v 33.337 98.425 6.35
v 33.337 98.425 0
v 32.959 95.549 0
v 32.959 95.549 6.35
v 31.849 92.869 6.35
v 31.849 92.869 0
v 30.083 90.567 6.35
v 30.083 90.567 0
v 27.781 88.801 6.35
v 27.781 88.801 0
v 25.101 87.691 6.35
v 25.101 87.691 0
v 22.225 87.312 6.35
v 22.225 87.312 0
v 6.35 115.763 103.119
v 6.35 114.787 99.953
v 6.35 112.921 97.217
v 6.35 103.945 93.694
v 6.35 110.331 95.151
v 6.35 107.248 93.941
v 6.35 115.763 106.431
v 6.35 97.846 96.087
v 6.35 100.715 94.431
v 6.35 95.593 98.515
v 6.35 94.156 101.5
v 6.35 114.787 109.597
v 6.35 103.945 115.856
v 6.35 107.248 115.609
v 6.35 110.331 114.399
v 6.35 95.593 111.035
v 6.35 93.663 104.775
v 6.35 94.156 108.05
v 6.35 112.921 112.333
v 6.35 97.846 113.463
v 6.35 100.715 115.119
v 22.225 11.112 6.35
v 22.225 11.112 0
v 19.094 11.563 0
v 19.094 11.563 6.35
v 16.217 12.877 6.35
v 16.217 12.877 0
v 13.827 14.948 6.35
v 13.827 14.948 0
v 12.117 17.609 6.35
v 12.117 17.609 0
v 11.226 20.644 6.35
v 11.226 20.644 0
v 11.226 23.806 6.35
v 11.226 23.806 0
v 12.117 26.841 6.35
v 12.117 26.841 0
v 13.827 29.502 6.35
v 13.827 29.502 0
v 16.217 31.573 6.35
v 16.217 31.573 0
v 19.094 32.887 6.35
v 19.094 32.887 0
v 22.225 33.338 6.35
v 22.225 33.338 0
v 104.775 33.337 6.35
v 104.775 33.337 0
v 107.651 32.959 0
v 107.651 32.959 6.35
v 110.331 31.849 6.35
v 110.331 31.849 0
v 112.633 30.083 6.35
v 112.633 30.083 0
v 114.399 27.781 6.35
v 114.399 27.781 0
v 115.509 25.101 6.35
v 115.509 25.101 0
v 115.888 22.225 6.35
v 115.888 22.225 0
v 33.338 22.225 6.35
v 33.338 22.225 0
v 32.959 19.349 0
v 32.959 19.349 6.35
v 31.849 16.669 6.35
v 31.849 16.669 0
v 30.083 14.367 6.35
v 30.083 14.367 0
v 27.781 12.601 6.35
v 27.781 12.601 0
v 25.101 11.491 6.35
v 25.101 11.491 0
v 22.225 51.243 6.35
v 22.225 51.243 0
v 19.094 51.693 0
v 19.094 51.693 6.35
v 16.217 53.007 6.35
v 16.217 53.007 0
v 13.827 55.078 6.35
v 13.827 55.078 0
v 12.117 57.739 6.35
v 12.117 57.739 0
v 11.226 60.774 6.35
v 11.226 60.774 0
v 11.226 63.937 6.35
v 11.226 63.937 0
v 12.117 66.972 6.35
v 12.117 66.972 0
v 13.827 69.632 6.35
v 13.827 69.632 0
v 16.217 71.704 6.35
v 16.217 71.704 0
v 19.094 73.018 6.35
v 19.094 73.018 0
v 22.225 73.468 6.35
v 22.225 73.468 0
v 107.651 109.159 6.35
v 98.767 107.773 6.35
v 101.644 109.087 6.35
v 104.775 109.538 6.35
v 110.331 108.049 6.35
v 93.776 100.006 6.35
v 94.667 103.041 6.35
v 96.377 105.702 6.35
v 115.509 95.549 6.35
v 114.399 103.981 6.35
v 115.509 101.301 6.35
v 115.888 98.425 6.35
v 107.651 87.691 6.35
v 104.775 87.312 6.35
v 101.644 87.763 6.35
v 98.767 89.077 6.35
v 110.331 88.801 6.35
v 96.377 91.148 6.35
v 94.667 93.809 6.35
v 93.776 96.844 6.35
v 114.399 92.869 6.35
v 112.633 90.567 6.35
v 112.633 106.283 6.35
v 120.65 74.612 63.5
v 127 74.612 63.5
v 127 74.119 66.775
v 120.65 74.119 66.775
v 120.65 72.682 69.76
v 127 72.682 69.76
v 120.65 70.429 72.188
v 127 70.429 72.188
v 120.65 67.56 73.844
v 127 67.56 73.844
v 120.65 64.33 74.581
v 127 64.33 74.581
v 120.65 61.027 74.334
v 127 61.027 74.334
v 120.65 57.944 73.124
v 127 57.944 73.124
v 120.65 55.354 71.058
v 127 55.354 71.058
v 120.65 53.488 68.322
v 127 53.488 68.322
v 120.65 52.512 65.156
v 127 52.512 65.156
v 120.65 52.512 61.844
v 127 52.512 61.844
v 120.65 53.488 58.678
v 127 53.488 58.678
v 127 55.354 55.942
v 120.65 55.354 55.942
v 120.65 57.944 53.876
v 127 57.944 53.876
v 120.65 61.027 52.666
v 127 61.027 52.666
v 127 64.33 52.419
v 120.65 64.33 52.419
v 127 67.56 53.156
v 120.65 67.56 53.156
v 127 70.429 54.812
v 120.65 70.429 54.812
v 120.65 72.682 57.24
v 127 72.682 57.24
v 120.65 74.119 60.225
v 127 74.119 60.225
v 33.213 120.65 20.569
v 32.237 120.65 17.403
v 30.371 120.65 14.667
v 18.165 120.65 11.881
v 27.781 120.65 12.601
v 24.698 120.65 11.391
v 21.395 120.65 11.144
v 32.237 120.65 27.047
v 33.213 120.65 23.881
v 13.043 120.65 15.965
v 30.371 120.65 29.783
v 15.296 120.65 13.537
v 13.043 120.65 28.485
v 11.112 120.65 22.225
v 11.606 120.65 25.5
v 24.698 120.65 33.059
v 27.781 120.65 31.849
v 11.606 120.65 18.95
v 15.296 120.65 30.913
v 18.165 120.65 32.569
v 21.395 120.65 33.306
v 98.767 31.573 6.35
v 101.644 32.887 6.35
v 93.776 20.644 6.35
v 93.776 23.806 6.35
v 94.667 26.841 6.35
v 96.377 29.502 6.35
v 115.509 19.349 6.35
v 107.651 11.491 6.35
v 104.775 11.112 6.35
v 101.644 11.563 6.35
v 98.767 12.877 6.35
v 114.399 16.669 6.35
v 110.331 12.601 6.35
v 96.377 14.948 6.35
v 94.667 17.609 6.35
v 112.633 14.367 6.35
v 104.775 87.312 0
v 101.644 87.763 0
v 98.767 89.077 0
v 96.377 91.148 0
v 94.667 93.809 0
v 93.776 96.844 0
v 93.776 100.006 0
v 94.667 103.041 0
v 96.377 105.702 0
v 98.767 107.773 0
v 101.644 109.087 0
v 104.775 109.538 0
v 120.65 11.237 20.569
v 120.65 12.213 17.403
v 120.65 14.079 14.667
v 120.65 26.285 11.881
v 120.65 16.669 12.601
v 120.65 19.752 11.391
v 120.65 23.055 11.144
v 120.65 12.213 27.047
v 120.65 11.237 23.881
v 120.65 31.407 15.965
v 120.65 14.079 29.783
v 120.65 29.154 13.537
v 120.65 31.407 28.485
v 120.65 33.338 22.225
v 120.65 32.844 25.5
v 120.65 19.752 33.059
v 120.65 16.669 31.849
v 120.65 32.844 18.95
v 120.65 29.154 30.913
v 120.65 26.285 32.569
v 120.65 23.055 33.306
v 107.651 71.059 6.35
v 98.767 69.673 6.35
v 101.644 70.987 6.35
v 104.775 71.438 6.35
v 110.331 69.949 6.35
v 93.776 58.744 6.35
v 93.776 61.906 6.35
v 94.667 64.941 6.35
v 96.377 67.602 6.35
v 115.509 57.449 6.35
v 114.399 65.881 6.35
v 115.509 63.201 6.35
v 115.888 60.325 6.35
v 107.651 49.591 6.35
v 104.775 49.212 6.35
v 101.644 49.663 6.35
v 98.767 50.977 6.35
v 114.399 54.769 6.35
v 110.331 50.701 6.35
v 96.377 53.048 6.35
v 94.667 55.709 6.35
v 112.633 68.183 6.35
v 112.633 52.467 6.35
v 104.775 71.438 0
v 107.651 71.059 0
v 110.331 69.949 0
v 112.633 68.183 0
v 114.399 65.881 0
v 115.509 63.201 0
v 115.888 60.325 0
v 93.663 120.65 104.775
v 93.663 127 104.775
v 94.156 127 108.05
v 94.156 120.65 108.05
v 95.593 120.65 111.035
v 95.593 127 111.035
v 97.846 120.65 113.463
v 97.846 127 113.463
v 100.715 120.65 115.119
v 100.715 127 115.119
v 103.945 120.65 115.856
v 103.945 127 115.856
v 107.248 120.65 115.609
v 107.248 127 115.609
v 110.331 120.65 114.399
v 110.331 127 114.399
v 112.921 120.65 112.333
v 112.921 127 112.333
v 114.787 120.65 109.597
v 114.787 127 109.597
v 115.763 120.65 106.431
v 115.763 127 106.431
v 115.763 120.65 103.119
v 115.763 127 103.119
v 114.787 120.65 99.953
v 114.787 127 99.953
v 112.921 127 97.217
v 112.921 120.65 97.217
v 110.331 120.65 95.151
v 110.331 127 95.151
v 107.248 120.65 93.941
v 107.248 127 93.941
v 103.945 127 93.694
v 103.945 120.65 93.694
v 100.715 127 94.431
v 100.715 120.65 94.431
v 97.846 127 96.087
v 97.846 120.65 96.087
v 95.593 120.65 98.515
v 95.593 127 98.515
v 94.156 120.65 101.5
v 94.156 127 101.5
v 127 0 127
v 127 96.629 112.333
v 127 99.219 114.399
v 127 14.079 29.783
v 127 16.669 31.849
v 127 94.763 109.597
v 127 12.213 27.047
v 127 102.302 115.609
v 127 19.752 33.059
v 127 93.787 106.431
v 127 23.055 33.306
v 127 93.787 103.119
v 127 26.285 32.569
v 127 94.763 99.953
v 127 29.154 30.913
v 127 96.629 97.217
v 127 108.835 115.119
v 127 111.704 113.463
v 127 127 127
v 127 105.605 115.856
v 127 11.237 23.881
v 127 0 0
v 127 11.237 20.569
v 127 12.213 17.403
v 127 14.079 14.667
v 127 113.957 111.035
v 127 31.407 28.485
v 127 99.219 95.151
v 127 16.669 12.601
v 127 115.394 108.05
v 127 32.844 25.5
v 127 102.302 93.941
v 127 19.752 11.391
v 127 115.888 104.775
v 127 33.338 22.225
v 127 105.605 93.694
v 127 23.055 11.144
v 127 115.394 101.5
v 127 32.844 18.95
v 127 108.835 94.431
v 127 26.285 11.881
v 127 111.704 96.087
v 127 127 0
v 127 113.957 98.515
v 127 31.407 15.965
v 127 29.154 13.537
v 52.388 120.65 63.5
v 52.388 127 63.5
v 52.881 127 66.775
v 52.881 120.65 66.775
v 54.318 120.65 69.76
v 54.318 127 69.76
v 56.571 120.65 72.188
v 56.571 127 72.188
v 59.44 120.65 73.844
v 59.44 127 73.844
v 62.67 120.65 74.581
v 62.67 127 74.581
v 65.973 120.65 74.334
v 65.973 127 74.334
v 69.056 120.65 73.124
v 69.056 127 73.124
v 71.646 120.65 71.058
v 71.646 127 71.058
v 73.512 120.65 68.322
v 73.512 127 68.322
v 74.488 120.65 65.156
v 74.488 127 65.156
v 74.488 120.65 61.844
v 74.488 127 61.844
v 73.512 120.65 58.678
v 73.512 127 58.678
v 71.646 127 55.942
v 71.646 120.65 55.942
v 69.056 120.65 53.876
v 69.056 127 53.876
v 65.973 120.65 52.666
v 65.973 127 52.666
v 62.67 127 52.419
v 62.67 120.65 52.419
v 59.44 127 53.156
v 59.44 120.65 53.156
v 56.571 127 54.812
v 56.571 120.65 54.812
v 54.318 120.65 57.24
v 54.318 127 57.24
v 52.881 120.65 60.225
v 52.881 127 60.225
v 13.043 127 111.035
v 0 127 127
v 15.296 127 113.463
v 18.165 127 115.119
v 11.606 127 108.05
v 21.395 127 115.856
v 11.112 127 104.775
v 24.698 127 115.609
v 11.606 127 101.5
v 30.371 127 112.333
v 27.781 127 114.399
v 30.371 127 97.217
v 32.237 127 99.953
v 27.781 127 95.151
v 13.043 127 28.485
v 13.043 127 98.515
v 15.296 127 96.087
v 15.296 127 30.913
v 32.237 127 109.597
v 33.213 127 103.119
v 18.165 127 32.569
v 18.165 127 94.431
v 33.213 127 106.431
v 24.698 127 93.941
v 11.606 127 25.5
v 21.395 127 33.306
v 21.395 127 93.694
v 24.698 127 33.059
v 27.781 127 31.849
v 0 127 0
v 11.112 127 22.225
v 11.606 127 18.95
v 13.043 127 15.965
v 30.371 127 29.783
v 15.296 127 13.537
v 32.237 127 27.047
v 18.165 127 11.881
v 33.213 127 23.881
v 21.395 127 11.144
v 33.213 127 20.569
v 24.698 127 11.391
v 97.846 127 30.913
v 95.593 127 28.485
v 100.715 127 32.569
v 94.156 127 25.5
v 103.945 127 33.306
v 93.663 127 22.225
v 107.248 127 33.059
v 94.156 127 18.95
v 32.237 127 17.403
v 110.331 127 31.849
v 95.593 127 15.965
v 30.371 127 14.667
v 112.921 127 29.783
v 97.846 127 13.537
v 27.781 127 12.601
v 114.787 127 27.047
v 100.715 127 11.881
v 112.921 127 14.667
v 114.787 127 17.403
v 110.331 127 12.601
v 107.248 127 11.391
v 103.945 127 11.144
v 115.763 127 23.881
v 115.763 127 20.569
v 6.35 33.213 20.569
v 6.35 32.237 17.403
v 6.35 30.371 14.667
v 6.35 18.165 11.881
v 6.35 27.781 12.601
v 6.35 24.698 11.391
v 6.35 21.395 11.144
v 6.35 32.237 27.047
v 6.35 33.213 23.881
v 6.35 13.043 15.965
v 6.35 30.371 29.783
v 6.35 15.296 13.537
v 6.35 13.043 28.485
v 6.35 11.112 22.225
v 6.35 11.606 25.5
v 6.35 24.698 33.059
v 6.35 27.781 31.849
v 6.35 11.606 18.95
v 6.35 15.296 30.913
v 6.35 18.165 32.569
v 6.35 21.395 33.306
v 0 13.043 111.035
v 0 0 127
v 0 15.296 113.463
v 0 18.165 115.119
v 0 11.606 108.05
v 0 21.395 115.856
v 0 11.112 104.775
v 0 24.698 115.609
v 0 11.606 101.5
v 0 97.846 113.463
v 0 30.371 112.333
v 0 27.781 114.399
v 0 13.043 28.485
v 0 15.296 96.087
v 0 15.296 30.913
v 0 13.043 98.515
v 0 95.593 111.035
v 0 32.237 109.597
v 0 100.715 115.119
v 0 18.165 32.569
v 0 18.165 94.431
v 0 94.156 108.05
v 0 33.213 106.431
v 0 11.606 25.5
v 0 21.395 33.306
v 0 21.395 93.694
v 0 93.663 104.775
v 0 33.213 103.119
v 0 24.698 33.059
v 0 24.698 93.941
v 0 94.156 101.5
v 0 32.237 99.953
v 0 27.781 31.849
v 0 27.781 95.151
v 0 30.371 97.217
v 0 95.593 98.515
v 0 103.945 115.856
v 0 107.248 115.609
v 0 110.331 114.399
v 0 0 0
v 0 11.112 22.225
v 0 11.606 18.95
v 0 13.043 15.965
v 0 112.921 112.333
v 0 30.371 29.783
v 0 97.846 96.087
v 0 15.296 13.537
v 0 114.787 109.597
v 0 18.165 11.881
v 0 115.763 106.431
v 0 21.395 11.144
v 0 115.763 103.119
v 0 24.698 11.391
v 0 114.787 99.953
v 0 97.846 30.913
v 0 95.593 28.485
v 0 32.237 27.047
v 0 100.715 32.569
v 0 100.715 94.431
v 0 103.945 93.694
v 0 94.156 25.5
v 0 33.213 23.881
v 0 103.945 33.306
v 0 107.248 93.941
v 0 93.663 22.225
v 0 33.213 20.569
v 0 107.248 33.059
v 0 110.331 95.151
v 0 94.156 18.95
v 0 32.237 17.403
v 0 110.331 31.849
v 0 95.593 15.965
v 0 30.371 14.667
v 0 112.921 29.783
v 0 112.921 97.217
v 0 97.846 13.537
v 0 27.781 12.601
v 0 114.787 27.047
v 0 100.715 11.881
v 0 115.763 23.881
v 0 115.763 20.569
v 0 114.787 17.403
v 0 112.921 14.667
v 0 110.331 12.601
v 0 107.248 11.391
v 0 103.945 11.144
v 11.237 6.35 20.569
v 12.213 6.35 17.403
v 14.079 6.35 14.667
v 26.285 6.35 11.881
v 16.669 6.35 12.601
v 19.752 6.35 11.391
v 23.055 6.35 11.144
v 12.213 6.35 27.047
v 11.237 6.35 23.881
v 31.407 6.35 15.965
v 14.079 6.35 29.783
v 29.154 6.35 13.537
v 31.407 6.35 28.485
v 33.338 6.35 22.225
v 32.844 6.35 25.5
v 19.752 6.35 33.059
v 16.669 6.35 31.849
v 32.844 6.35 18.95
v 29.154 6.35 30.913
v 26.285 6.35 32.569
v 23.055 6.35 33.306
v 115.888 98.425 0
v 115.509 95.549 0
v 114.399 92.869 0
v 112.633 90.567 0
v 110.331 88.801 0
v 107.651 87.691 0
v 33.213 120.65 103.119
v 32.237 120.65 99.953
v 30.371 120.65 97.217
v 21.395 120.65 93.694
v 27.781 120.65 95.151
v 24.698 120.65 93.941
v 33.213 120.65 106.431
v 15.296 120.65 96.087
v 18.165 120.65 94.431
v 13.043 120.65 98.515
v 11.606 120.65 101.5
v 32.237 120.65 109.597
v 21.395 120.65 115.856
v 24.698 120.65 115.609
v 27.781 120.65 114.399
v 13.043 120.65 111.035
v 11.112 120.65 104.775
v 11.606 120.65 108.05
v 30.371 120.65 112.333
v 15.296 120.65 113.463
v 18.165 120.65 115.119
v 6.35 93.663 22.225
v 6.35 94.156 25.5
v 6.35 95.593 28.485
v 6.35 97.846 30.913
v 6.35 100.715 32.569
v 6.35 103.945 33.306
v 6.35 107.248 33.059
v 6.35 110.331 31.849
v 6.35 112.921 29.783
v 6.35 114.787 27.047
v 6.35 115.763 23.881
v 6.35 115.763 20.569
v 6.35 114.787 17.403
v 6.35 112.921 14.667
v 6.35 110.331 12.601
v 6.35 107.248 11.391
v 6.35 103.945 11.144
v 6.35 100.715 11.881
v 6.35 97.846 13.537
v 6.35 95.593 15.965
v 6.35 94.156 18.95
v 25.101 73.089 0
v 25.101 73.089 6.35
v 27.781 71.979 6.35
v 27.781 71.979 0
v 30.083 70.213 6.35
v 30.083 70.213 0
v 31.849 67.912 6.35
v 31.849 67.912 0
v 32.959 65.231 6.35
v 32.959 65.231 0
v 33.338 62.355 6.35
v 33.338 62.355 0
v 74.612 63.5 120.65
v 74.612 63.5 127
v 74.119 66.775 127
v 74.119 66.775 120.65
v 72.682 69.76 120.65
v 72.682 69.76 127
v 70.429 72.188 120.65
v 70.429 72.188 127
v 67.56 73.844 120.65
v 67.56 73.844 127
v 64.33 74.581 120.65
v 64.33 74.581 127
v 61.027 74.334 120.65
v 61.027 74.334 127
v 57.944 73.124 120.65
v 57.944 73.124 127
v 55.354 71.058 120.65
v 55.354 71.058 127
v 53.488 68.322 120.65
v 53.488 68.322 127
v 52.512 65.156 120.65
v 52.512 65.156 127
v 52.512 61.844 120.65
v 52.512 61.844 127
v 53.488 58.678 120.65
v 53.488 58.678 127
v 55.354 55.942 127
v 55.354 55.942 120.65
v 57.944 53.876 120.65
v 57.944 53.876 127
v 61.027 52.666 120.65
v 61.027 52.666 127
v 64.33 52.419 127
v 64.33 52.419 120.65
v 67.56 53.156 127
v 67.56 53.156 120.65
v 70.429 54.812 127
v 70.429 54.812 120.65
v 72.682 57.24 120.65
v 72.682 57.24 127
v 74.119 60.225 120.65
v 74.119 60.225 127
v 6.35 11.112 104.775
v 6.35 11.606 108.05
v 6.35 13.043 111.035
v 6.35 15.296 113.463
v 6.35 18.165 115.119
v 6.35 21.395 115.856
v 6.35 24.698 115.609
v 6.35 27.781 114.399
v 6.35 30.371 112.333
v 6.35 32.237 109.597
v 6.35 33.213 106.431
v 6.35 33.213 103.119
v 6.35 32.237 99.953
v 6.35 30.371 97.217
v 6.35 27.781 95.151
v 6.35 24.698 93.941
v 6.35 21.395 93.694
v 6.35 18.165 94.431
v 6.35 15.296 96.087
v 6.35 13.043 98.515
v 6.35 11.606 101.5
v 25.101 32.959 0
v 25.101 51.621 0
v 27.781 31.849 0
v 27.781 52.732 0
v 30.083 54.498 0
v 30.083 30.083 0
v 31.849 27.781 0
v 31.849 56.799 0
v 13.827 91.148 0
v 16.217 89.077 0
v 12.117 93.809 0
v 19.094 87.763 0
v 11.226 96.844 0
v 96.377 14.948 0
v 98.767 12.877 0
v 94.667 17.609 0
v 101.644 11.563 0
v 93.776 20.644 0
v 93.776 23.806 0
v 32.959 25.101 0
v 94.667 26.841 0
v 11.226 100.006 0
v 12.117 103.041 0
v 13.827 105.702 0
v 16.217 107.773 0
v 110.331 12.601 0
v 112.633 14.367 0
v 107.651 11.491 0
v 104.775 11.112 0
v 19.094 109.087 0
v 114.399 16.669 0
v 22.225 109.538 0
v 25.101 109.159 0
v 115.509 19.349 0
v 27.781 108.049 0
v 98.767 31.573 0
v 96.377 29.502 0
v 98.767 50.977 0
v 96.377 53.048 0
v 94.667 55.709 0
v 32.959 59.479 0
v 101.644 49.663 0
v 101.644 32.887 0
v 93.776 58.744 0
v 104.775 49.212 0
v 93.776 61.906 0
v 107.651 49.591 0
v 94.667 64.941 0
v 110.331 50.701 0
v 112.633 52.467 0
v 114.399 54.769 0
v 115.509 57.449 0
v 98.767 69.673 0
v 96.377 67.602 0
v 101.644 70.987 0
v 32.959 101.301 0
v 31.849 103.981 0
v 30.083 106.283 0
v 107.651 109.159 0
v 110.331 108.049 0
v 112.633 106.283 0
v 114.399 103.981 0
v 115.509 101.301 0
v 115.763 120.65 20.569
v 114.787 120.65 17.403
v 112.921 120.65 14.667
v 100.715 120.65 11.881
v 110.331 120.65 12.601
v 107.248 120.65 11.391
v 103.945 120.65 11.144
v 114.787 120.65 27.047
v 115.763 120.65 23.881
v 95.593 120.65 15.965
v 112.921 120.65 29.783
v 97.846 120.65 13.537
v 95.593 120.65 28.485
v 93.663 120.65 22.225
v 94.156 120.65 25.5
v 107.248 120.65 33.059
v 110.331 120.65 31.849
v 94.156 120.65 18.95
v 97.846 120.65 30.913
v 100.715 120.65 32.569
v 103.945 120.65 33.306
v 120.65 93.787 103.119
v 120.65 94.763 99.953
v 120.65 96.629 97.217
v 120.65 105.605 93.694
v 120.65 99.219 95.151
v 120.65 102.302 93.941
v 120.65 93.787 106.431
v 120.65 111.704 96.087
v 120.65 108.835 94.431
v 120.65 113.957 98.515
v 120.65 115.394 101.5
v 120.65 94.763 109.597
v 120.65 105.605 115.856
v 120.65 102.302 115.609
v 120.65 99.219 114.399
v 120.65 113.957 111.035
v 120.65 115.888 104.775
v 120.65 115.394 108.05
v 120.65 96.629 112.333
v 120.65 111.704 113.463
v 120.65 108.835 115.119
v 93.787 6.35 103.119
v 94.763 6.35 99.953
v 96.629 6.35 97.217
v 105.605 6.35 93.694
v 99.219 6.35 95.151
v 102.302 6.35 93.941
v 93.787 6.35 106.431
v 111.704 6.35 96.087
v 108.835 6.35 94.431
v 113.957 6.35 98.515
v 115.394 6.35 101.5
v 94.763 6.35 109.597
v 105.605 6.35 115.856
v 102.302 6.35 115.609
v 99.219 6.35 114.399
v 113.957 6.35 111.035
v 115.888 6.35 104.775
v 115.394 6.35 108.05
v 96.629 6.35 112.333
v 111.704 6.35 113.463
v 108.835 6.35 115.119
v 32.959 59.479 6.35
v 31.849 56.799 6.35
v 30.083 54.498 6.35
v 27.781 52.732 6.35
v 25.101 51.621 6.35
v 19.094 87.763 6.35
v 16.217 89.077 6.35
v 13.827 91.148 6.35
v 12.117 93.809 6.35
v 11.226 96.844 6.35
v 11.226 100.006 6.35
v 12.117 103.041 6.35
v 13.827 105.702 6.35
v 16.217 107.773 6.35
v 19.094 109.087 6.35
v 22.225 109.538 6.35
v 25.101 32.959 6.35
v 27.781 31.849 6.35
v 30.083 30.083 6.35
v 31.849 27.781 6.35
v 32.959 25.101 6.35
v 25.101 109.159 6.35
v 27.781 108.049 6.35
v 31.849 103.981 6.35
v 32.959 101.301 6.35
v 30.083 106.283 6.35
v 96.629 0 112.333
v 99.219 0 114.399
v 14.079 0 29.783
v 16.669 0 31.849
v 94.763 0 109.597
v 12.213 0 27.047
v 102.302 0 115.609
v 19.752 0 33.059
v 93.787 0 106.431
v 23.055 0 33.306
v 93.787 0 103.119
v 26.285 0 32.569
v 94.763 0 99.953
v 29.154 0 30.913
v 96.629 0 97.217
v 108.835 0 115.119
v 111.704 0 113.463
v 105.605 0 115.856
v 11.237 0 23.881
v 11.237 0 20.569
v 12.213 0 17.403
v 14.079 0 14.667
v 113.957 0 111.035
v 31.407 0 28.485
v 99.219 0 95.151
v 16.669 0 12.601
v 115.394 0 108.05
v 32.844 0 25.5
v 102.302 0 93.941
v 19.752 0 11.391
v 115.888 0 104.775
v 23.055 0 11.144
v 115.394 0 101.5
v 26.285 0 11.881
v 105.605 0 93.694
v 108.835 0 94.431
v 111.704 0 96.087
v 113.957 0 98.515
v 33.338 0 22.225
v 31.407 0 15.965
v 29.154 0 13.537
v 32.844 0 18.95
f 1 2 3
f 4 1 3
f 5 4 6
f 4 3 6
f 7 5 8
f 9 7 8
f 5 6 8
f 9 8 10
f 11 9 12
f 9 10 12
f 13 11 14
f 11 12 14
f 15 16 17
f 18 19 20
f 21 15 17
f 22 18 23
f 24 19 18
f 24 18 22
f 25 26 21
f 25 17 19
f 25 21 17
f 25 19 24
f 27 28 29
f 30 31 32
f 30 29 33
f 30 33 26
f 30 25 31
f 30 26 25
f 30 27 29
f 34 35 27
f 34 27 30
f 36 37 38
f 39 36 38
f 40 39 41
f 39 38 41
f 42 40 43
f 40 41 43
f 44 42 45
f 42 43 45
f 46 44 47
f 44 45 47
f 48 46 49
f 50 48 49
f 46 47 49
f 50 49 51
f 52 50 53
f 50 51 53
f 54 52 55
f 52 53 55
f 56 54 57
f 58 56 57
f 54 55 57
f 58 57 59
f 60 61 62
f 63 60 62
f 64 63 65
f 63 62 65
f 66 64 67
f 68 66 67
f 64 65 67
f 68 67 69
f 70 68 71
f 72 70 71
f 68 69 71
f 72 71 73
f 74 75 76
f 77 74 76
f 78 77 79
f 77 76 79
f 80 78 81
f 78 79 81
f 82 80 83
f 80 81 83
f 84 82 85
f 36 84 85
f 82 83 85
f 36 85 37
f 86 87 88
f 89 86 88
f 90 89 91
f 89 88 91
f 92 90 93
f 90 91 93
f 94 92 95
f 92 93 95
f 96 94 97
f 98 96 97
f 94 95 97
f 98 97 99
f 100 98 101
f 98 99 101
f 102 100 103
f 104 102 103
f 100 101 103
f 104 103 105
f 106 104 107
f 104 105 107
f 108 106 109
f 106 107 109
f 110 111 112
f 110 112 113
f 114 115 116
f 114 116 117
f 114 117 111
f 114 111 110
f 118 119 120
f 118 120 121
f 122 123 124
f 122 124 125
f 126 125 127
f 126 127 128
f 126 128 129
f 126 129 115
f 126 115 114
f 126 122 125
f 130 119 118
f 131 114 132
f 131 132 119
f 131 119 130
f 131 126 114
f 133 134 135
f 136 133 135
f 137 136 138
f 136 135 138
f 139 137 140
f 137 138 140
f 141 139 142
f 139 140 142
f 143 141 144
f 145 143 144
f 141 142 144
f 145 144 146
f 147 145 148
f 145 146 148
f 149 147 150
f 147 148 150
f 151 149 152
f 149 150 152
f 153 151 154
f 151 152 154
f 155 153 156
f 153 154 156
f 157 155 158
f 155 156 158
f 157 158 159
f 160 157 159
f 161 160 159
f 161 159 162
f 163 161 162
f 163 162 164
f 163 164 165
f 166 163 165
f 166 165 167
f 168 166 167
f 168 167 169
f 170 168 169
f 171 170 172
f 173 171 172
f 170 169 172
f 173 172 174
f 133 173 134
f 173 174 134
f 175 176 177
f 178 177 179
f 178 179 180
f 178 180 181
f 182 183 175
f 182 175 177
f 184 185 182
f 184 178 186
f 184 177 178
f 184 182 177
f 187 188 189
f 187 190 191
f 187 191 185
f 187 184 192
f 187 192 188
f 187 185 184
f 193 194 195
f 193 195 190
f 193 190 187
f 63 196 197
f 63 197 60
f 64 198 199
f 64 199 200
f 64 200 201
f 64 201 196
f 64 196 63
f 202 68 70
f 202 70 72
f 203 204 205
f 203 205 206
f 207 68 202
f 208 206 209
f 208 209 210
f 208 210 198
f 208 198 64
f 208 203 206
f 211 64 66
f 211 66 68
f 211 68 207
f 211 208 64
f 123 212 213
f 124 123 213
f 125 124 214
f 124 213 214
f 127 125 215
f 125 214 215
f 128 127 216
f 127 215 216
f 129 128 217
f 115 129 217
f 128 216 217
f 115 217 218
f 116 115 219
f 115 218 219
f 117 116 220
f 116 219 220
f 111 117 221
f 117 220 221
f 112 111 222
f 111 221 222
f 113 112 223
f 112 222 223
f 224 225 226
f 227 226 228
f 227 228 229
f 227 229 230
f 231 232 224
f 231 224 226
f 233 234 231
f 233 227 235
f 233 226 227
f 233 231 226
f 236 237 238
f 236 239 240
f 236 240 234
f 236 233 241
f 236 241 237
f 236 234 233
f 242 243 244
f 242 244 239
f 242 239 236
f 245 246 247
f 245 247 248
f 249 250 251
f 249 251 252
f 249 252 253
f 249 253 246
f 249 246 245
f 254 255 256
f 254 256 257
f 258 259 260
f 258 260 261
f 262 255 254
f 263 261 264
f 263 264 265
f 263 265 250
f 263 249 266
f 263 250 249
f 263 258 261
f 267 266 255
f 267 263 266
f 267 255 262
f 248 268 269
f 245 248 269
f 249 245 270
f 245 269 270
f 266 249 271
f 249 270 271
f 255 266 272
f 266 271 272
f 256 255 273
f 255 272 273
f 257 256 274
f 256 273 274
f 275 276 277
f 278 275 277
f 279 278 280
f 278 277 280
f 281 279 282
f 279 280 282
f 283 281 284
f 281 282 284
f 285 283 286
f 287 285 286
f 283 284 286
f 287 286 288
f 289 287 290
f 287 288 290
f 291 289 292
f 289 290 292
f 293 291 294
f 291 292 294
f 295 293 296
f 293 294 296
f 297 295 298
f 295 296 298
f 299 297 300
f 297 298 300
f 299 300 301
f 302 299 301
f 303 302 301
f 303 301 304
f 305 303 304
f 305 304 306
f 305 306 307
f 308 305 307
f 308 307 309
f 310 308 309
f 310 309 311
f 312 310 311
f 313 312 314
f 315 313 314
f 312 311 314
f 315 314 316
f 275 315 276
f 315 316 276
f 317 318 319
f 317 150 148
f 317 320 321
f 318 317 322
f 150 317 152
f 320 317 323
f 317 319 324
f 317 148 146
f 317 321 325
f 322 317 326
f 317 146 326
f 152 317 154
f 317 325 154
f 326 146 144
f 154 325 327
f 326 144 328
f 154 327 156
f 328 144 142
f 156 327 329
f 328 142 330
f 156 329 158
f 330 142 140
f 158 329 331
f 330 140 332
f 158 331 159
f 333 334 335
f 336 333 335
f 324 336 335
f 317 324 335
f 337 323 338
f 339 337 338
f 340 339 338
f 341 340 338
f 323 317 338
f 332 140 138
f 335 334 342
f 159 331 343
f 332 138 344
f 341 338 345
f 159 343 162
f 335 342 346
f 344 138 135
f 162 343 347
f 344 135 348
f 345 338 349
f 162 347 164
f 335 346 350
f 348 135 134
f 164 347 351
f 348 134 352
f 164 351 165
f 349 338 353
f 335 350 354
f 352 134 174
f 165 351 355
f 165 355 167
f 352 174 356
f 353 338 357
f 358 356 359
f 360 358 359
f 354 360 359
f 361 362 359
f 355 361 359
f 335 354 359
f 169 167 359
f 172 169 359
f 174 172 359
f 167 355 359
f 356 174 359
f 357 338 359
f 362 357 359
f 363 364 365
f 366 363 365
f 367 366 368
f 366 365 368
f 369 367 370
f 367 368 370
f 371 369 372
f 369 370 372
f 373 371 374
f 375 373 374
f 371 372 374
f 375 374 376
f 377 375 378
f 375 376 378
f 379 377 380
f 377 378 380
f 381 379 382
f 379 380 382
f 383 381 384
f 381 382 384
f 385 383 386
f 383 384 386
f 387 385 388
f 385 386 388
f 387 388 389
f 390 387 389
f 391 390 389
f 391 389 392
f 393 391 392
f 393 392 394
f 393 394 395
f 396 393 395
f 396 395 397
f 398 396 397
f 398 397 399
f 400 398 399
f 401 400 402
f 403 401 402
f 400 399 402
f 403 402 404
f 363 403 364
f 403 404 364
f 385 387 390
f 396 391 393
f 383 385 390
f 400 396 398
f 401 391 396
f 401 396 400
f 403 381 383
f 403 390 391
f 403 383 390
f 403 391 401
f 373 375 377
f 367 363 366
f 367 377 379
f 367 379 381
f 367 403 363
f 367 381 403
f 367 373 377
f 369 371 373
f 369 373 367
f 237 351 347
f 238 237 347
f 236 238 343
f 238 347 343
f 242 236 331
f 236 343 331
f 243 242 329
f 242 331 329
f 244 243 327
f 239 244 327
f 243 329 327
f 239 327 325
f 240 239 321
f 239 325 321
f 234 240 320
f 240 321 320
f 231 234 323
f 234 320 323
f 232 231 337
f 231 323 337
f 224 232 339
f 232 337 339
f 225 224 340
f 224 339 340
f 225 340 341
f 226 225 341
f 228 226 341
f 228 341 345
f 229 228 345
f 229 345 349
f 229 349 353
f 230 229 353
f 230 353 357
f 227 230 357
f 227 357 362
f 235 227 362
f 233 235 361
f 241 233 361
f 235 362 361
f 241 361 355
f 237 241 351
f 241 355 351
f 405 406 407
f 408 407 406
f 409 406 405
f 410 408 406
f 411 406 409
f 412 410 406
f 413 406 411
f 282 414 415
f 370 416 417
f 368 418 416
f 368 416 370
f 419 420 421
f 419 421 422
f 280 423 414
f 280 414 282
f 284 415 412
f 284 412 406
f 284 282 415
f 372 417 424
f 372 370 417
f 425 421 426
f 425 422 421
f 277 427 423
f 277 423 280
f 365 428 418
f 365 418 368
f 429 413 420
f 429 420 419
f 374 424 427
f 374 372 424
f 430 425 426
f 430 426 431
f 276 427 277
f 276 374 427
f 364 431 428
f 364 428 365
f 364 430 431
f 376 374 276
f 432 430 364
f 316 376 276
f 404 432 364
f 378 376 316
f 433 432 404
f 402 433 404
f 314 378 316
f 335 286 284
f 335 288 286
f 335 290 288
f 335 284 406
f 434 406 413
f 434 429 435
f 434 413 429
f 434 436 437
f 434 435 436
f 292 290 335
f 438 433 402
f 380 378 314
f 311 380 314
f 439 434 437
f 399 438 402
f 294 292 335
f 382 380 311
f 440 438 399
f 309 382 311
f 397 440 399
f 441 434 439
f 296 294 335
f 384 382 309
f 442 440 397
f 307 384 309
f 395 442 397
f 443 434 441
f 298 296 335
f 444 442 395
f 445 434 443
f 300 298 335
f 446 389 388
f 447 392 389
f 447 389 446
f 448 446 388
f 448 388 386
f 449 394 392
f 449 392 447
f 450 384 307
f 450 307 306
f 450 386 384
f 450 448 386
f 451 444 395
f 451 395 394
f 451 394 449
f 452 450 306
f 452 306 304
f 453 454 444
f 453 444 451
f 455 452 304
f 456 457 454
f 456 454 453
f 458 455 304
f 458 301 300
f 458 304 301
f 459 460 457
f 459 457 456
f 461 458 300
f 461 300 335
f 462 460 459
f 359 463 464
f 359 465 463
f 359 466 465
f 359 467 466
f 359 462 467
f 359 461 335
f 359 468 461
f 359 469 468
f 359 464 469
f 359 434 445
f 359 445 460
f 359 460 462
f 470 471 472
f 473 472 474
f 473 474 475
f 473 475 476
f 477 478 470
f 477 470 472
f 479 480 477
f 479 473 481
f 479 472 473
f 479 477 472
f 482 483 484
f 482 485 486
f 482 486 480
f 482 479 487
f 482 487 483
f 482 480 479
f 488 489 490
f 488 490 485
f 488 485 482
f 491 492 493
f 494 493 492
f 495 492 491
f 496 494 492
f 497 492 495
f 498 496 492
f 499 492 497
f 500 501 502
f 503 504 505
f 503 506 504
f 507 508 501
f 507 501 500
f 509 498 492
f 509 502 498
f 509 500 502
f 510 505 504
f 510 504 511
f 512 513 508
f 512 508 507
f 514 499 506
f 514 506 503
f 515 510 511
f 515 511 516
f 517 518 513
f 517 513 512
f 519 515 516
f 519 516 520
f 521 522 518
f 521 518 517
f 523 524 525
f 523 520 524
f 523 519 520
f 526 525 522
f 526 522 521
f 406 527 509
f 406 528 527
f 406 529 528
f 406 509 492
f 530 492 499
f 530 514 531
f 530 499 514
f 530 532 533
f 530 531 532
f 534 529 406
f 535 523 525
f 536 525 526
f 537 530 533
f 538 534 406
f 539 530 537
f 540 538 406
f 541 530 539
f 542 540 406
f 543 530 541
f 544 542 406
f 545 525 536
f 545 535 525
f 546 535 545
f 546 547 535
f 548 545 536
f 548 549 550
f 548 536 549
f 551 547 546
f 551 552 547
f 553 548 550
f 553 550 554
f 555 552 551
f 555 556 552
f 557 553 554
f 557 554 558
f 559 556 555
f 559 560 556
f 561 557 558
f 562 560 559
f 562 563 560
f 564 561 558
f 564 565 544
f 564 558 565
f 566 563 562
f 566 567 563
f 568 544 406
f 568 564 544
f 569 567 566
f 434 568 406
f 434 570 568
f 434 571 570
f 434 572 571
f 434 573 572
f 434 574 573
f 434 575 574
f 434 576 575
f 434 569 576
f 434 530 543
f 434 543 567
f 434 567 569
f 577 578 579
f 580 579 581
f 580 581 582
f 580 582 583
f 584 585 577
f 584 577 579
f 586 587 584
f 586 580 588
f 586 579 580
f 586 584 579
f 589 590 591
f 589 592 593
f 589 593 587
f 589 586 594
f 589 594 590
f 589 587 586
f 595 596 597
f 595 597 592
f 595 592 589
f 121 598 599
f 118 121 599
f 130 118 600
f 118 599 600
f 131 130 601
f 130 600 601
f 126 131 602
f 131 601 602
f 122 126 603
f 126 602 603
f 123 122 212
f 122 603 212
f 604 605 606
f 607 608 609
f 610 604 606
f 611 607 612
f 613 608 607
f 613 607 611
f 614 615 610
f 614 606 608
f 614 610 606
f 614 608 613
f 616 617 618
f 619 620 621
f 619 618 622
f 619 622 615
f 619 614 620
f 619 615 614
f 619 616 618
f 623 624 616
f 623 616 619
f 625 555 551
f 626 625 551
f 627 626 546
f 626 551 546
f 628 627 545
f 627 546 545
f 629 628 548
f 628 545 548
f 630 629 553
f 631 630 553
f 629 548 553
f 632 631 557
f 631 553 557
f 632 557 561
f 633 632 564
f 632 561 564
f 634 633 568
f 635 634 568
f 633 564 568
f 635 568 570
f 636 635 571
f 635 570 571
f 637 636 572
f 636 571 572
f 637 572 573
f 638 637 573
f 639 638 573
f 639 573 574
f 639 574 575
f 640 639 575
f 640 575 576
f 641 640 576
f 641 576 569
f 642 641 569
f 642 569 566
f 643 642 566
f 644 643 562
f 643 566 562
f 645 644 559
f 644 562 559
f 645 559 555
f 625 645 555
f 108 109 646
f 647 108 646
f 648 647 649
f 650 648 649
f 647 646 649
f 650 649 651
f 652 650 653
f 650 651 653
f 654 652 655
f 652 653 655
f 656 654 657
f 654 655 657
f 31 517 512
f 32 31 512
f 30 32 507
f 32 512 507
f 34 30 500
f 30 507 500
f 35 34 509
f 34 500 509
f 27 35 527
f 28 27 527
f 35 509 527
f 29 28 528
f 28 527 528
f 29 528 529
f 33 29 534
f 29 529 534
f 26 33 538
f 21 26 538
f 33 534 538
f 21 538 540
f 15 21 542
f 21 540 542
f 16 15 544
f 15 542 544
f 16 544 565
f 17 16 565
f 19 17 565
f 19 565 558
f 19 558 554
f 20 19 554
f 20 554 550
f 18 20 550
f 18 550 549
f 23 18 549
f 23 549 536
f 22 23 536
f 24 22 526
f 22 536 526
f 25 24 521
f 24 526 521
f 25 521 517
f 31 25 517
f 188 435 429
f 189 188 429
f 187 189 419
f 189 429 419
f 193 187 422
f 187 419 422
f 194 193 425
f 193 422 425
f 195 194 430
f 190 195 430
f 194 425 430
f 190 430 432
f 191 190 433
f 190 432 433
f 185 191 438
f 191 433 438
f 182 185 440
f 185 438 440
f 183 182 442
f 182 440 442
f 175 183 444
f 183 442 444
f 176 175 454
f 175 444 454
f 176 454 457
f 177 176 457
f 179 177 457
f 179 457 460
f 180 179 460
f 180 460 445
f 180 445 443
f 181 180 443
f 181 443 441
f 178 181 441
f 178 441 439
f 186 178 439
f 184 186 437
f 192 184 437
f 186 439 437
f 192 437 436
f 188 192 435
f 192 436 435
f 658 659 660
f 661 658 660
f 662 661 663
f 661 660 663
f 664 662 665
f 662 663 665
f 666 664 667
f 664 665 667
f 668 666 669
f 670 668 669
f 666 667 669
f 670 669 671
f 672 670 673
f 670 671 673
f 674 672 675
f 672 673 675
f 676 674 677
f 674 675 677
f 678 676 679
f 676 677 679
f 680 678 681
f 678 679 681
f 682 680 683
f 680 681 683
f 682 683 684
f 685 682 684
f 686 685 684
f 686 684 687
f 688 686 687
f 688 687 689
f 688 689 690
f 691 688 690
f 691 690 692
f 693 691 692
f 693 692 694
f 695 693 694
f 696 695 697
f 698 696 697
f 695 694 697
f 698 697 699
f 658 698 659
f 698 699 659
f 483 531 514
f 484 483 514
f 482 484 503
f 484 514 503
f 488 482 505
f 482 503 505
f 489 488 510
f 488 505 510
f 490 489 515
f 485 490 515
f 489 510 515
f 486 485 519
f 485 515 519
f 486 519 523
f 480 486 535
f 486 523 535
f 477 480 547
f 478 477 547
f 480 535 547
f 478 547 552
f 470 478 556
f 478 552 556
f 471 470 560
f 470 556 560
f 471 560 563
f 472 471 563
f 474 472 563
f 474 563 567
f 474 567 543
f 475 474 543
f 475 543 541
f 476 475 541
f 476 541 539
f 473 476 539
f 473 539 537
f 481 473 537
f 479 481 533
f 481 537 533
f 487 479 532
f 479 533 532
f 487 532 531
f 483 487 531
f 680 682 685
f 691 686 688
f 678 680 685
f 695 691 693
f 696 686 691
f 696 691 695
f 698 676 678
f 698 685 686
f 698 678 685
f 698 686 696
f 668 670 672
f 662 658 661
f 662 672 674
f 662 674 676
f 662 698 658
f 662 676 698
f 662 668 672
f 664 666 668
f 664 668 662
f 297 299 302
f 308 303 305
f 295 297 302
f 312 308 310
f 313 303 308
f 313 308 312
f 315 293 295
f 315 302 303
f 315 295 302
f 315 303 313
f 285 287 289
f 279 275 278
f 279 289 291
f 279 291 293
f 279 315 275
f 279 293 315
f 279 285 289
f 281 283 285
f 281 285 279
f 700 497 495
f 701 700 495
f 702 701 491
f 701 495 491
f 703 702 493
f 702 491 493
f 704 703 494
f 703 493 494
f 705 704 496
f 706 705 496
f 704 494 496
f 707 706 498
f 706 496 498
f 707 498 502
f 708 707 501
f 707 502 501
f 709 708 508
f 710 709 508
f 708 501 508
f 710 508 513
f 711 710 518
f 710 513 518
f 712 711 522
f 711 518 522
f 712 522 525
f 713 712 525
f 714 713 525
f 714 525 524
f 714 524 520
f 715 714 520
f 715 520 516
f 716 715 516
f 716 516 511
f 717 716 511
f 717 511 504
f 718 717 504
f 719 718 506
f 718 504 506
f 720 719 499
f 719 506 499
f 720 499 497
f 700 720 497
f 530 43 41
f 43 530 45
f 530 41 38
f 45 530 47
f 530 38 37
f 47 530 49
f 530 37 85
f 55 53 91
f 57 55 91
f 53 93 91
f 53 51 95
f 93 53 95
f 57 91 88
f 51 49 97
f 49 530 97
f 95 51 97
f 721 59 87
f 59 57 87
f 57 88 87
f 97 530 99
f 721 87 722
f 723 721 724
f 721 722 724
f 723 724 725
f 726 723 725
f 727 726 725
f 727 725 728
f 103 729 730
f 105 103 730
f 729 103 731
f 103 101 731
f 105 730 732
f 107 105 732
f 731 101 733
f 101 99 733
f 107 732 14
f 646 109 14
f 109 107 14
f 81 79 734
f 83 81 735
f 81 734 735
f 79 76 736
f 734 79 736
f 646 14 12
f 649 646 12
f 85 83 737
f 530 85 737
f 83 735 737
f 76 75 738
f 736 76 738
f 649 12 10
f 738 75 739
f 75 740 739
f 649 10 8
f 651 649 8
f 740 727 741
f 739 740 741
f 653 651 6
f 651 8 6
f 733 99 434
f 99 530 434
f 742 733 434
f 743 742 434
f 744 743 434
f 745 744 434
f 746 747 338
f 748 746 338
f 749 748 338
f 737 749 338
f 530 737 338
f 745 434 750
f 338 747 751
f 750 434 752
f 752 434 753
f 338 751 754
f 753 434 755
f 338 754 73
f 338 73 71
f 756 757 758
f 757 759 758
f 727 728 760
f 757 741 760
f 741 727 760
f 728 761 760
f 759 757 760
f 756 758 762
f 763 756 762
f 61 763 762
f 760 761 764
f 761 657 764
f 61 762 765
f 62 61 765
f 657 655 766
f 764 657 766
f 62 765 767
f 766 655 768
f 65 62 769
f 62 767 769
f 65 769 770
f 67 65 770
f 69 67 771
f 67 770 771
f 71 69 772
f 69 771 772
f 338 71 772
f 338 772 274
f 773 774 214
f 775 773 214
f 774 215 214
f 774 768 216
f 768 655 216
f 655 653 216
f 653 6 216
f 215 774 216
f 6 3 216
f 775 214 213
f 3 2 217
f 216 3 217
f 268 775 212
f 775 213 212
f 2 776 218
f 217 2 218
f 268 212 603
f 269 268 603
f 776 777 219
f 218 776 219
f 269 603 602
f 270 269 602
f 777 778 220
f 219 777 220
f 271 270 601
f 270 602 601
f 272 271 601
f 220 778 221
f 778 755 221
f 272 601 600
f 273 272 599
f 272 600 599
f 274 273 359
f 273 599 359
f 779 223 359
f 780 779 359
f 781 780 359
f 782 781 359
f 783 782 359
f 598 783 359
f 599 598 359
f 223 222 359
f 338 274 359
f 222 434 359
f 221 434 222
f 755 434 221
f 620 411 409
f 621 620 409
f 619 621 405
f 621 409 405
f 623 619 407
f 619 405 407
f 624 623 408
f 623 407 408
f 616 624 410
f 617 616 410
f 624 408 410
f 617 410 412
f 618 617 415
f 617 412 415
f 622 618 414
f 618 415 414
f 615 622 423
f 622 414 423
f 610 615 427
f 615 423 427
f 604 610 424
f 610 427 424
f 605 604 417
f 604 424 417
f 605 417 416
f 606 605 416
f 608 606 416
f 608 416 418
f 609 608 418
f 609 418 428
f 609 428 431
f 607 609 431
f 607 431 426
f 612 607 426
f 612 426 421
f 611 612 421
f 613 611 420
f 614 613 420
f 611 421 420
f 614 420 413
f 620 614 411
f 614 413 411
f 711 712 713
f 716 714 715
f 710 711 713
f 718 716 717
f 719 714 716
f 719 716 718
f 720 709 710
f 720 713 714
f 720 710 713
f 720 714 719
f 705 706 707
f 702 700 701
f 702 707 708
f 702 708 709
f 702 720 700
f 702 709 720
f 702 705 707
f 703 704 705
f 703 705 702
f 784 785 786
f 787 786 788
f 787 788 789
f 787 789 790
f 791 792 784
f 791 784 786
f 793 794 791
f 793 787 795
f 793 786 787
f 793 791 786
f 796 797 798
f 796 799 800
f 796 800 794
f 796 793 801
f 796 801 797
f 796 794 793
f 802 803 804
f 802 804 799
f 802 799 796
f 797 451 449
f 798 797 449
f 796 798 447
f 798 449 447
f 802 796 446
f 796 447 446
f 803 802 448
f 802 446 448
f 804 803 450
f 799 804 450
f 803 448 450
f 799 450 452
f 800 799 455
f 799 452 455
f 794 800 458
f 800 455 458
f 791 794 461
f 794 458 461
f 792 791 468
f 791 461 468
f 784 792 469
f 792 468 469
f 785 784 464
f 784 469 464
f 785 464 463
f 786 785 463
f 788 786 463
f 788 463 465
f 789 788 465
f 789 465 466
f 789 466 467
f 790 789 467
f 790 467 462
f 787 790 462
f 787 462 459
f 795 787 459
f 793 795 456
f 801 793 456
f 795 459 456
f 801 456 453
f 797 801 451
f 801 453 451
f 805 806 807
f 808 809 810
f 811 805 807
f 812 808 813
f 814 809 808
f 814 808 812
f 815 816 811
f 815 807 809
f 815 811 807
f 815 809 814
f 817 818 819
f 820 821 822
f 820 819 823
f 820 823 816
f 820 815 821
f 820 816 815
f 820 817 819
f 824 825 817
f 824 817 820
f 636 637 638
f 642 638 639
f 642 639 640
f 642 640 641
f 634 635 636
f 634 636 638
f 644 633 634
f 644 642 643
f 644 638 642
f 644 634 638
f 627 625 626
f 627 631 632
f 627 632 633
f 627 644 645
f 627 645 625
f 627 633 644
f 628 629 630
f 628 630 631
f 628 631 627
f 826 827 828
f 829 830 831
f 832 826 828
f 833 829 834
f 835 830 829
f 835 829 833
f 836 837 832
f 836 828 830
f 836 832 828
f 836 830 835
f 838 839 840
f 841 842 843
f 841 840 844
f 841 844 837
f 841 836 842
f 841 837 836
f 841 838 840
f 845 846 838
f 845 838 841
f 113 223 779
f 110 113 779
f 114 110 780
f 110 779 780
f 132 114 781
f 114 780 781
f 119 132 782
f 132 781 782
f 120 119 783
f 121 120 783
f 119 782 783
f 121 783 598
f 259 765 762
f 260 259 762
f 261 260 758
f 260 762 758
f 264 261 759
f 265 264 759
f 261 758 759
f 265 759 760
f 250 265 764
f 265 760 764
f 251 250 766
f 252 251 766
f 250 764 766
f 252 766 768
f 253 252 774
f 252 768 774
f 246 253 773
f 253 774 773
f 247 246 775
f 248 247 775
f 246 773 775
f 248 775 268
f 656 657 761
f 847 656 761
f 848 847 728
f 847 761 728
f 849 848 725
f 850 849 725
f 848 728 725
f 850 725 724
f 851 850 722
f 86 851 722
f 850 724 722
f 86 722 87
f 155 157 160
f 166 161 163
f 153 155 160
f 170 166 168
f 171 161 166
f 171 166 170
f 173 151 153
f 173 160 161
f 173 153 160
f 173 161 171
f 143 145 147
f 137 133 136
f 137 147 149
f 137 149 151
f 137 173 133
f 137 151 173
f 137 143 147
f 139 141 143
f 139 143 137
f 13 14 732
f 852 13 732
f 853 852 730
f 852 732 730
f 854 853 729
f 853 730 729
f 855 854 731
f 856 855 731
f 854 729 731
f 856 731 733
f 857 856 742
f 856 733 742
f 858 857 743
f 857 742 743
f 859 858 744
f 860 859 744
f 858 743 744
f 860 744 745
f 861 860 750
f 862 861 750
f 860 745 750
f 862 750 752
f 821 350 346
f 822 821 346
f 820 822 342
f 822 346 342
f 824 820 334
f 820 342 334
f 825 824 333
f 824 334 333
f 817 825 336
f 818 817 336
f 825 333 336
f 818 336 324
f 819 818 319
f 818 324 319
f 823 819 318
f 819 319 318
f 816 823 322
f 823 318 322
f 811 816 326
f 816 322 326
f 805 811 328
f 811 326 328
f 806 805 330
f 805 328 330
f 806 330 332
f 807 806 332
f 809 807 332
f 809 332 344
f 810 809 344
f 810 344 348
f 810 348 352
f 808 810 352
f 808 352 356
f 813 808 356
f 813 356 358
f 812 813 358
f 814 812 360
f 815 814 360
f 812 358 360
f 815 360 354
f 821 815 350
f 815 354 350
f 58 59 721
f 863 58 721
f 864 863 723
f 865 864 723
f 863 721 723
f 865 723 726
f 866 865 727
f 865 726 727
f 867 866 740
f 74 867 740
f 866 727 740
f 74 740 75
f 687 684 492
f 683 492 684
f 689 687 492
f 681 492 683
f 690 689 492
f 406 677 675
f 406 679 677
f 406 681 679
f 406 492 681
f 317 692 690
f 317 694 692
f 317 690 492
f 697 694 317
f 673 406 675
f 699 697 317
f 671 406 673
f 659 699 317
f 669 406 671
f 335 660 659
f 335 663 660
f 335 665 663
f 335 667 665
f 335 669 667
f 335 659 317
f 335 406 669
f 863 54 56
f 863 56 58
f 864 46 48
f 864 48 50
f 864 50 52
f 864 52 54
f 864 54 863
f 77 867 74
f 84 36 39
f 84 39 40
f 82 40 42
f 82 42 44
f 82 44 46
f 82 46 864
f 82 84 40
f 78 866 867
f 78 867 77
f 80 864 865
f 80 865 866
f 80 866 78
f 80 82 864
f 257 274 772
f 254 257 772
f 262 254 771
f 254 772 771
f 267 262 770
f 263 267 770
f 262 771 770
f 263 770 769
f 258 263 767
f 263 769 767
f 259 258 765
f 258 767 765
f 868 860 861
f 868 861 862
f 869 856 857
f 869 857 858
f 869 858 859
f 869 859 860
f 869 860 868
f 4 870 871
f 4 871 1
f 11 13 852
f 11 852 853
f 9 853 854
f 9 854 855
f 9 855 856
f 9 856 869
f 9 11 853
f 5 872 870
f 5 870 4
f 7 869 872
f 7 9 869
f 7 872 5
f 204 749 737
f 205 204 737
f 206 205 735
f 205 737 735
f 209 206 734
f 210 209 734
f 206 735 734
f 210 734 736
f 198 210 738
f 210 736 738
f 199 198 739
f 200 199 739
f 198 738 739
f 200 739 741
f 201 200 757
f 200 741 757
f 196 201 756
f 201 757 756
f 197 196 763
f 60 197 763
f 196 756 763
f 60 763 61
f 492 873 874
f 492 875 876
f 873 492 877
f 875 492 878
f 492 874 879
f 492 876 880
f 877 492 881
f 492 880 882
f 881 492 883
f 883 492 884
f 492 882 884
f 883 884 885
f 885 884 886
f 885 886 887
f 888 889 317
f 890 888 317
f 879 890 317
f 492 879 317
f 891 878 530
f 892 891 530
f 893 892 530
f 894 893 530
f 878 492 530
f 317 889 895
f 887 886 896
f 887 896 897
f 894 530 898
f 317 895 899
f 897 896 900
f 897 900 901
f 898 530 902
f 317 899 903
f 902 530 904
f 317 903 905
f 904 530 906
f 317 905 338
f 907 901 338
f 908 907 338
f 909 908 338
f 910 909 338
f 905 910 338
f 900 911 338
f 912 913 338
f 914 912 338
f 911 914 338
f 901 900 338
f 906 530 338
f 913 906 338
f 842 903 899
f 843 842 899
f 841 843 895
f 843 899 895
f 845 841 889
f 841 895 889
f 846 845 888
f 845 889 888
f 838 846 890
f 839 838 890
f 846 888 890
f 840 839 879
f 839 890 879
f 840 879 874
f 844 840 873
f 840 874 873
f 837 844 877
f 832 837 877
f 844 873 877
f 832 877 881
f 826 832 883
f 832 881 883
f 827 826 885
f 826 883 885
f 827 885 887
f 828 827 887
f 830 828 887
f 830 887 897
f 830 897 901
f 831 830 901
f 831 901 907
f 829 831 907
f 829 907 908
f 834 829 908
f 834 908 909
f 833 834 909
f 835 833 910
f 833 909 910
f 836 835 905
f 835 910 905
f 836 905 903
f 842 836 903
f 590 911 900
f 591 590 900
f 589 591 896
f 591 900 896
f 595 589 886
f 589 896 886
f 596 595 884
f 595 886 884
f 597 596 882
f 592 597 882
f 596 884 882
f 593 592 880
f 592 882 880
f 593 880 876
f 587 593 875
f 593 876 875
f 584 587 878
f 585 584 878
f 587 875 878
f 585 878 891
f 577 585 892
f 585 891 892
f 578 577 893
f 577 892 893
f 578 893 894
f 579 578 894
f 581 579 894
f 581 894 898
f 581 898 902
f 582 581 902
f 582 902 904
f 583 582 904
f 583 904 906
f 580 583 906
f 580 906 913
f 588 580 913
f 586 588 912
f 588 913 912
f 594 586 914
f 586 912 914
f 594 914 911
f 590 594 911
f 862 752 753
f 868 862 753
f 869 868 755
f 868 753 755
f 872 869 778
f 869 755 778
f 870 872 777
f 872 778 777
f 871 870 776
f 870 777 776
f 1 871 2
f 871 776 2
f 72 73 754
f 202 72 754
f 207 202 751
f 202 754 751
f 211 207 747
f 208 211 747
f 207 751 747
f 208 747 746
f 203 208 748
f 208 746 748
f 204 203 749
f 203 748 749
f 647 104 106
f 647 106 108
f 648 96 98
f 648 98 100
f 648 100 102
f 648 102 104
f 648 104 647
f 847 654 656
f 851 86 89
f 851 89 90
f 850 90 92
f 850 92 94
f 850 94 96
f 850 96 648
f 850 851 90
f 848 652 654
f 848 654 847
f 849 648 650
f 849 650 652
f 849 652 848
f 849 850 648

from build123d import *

# Parameters (mm, degrees)
F0_W      = 127
F0_H      = 127
F1_DEPTH  = 127
F2_R      = 11.1125
F3_DEPTH  = 6.35
F4_R      = 11.1125
F5_DEPTH  = 6.35
F6_R      = 11.1125
F7_DEPTH  = 6.35
F9_R      = 11.1125
F10_DEPTH = 6.35
F12_DEPTH = 6.35
F8_R      = 11.1125
F13_DEPTH = 6.35


with BuildPart() as f1:
    # F0 (on Top) → F1 (new body)
    with BuildSketch(Plane.XY):
        with Locations((63.5, 63.5)):
            Rectangle(F0_W, F0_H)
    extrude(amount=F1_DEPTH)

    # F2 (on face) → F3 (cut)
    with BuildSketch(Plane.XY.offset(127)):
        with Locations((63.5, 63.5)):
            Circle(F2_R)
    extrude(amount=-F3_DEPTH, mode=Mode.SUBTRACT)

    # F4 (on face) → F5 (cut)
    with BuildSketch(Plane.XZ):
        with Locations((22.225, 22.225)):
            Circle(F4_R)
        with Locations((104.775, 104.775)):
            Circle(F4_R)
    extrude(amount=-F5_DEPTH, mode=Mode.SUBTRACT)

    # F6 (on face) → F7 (cut)
    with BuildSketch(Plane.YZ.offset(127)):
        with Locations((22.225, 22.225)):
            Circle(F6_R)
        with Locations((63.5, 63.5)):
            Circle(F6_R)
        with Locations((104.775, 104.775)):
            Circle(F6_R)
    extrude(amount=-F7_DEPTH, mode=Mode.SUBTRACT)

    # F9 (on face) → F10 (cut)
    with BuildSketch(Plane(origin=(0, 0, 0), x_dir=(0, -1, 0), z_dir=(-1, 0, 0))):
        with Locations((-104.775, 104.775)):
            Circle(F9_R)
        with Locations((-22.225, 104.775)):
            Circle(F9_R)
        with Locations((-104.775, 22.225)):
            Circle(F9_R)
        with Locations((-22.225, 22.225)):
            Circle(F9_R)
    extrude(amount=-F10_DEPTH, mode=Mode.SUBTRACT)

    # F11 (on face) → F12 (cut)
    with BuildSketch(Plane(origin=(0, 0, 0), x_dir=(1, 0, 0), z_dir=(0, 0, -1))):
        with BuildLine():
            ThreePointArc((33.3375, -22.225), (30.082724, -14.367276), (22.225, -11.1125))
            Line((22.225, -11.1125), (22.225, -33.3375))
            ThreePointArc((22.225, -33.3375), (30.082724, -30.082724), (33.3375, -22.225))
        make_face()
        with BuildLine():
            ThreePointArc((33.3375, -98.425), (30.082724, -90.567276), (22.225, -87.3125))
            Line((22.225, -87.3125), (22.225, -109.5375))
            ThreePointArc((22.225, -109.5375), (30.082724, -106.282724), (33.3375, -98.425))
        make_face()
        with BuildLine():
            Line((22.225, -109.5375), (22.225, -87.3125))
            ThreePointArc((22.225, -87.3125), (11.1125, -98.425), (22.225, -109.5375))
        make_face()
        with BuildLine():
            ThreePointArc((33.3375, -62.355265), (30.082724, -54.497541), (22.225, -51.242765))
            Line((22.225, -51.242765), (22.225, -73.467765))
            ThreePointArc((22.225, -73.467765), (30.082724, -70.212989), (33.3375, -62.355265))
        make_face()
        with BuildLine():
            Line((22.225, -73.467765), (22.225, -51.242765))
            ThreePointArc((22.225, -51.242765), (11.1125, -62.355265), (22.225, -73.467765))
        make_face()
        with BuildLine():
            Line((22.225, -33.3375), (22.225, -11.1125))
            ThreePointArc((22.225, -11.1125), (11.1125, -22.225), (22.225, -33.3375))
        make_face()
        with BuildLine():
            ThreePointArc((115.8875, -22.225), (112.632724, -14.367276), (104.775, -11.1125))
            Line((104.775, -11.1125), (104.775, -33.3375))
            ThreePointArc((104.775, -33.3375), (112.632724, -30.082724), (115.8875, -22.225))
        make_face()
        with BuildLine():
            ThreePointArc((115.8875, -98.425), (112.632724, -90.567276), (104.775, -87.3125))
            Line((104.775, -87.3125), (104.775, -109.5375))
            ThreePointArc((104.775, -109.5375), (112.632724, -106.282724), (115.8875, -98.425))
        make_face()
        with BuildLine():
            Line((104.775, -109.5375), (104.775, -87.3125))
            ThreePointArc((104.775, -87.3125), (93.6625, -98.425), (104.775, -109.5375))
        make_face()
        with BuildLine():
            ThreePointArc((115.8875, -60.325), (112.632724, -52.467276), (104.775, -49.2125))
            Line((104.775, -49.2125), (104.775, -71.4375))
            ThreePointArc((104.775, -71.4375), (112.632724, -68.182724), (115.8875, -60.325))
        make_face()
        with BuildLine():
            Line((104.775, -71.4375), (104.775, -49.2125))
            ThreePointArc((104.775, -49.2125), (93.6625, -60.325), (104.775, -71.4375))
        make_face()
        with BuildLine():
            Line((104.775, -33.3375), (104.775, -11.1125))
            ThreePointArc((104.775, -11.1125), (93.6625, -22.225), (104.775, -33.3375))
        make_face()
    extrude(amount=-F12_DEPTH, mode=Mode.SUBTRACT)

    # F8 (on face) → F13 (cut)
    with BuildSketch(Plane(origin=(0, 127, 0), x_dir=(-1, 0, 0), z_dir=(0, 1, 0))):
        with Locations((-63.5, 63.5)):
            Circle(F8_R)
        with Locations((-104.775, 104.775)):
            Circle(F8_R)
        with Locations((-22.225, 104.775)):
            Circle(F8_R)
        with Locations((-104.775, 22.225)):
            Circle(F8_R)
        with Locations((-22.225, 22.225)):
            Circle(F8_R)
    extrude(amount=-F13_DEPTH, mode=Mode.SUBTRACT)


solid = f1.part
